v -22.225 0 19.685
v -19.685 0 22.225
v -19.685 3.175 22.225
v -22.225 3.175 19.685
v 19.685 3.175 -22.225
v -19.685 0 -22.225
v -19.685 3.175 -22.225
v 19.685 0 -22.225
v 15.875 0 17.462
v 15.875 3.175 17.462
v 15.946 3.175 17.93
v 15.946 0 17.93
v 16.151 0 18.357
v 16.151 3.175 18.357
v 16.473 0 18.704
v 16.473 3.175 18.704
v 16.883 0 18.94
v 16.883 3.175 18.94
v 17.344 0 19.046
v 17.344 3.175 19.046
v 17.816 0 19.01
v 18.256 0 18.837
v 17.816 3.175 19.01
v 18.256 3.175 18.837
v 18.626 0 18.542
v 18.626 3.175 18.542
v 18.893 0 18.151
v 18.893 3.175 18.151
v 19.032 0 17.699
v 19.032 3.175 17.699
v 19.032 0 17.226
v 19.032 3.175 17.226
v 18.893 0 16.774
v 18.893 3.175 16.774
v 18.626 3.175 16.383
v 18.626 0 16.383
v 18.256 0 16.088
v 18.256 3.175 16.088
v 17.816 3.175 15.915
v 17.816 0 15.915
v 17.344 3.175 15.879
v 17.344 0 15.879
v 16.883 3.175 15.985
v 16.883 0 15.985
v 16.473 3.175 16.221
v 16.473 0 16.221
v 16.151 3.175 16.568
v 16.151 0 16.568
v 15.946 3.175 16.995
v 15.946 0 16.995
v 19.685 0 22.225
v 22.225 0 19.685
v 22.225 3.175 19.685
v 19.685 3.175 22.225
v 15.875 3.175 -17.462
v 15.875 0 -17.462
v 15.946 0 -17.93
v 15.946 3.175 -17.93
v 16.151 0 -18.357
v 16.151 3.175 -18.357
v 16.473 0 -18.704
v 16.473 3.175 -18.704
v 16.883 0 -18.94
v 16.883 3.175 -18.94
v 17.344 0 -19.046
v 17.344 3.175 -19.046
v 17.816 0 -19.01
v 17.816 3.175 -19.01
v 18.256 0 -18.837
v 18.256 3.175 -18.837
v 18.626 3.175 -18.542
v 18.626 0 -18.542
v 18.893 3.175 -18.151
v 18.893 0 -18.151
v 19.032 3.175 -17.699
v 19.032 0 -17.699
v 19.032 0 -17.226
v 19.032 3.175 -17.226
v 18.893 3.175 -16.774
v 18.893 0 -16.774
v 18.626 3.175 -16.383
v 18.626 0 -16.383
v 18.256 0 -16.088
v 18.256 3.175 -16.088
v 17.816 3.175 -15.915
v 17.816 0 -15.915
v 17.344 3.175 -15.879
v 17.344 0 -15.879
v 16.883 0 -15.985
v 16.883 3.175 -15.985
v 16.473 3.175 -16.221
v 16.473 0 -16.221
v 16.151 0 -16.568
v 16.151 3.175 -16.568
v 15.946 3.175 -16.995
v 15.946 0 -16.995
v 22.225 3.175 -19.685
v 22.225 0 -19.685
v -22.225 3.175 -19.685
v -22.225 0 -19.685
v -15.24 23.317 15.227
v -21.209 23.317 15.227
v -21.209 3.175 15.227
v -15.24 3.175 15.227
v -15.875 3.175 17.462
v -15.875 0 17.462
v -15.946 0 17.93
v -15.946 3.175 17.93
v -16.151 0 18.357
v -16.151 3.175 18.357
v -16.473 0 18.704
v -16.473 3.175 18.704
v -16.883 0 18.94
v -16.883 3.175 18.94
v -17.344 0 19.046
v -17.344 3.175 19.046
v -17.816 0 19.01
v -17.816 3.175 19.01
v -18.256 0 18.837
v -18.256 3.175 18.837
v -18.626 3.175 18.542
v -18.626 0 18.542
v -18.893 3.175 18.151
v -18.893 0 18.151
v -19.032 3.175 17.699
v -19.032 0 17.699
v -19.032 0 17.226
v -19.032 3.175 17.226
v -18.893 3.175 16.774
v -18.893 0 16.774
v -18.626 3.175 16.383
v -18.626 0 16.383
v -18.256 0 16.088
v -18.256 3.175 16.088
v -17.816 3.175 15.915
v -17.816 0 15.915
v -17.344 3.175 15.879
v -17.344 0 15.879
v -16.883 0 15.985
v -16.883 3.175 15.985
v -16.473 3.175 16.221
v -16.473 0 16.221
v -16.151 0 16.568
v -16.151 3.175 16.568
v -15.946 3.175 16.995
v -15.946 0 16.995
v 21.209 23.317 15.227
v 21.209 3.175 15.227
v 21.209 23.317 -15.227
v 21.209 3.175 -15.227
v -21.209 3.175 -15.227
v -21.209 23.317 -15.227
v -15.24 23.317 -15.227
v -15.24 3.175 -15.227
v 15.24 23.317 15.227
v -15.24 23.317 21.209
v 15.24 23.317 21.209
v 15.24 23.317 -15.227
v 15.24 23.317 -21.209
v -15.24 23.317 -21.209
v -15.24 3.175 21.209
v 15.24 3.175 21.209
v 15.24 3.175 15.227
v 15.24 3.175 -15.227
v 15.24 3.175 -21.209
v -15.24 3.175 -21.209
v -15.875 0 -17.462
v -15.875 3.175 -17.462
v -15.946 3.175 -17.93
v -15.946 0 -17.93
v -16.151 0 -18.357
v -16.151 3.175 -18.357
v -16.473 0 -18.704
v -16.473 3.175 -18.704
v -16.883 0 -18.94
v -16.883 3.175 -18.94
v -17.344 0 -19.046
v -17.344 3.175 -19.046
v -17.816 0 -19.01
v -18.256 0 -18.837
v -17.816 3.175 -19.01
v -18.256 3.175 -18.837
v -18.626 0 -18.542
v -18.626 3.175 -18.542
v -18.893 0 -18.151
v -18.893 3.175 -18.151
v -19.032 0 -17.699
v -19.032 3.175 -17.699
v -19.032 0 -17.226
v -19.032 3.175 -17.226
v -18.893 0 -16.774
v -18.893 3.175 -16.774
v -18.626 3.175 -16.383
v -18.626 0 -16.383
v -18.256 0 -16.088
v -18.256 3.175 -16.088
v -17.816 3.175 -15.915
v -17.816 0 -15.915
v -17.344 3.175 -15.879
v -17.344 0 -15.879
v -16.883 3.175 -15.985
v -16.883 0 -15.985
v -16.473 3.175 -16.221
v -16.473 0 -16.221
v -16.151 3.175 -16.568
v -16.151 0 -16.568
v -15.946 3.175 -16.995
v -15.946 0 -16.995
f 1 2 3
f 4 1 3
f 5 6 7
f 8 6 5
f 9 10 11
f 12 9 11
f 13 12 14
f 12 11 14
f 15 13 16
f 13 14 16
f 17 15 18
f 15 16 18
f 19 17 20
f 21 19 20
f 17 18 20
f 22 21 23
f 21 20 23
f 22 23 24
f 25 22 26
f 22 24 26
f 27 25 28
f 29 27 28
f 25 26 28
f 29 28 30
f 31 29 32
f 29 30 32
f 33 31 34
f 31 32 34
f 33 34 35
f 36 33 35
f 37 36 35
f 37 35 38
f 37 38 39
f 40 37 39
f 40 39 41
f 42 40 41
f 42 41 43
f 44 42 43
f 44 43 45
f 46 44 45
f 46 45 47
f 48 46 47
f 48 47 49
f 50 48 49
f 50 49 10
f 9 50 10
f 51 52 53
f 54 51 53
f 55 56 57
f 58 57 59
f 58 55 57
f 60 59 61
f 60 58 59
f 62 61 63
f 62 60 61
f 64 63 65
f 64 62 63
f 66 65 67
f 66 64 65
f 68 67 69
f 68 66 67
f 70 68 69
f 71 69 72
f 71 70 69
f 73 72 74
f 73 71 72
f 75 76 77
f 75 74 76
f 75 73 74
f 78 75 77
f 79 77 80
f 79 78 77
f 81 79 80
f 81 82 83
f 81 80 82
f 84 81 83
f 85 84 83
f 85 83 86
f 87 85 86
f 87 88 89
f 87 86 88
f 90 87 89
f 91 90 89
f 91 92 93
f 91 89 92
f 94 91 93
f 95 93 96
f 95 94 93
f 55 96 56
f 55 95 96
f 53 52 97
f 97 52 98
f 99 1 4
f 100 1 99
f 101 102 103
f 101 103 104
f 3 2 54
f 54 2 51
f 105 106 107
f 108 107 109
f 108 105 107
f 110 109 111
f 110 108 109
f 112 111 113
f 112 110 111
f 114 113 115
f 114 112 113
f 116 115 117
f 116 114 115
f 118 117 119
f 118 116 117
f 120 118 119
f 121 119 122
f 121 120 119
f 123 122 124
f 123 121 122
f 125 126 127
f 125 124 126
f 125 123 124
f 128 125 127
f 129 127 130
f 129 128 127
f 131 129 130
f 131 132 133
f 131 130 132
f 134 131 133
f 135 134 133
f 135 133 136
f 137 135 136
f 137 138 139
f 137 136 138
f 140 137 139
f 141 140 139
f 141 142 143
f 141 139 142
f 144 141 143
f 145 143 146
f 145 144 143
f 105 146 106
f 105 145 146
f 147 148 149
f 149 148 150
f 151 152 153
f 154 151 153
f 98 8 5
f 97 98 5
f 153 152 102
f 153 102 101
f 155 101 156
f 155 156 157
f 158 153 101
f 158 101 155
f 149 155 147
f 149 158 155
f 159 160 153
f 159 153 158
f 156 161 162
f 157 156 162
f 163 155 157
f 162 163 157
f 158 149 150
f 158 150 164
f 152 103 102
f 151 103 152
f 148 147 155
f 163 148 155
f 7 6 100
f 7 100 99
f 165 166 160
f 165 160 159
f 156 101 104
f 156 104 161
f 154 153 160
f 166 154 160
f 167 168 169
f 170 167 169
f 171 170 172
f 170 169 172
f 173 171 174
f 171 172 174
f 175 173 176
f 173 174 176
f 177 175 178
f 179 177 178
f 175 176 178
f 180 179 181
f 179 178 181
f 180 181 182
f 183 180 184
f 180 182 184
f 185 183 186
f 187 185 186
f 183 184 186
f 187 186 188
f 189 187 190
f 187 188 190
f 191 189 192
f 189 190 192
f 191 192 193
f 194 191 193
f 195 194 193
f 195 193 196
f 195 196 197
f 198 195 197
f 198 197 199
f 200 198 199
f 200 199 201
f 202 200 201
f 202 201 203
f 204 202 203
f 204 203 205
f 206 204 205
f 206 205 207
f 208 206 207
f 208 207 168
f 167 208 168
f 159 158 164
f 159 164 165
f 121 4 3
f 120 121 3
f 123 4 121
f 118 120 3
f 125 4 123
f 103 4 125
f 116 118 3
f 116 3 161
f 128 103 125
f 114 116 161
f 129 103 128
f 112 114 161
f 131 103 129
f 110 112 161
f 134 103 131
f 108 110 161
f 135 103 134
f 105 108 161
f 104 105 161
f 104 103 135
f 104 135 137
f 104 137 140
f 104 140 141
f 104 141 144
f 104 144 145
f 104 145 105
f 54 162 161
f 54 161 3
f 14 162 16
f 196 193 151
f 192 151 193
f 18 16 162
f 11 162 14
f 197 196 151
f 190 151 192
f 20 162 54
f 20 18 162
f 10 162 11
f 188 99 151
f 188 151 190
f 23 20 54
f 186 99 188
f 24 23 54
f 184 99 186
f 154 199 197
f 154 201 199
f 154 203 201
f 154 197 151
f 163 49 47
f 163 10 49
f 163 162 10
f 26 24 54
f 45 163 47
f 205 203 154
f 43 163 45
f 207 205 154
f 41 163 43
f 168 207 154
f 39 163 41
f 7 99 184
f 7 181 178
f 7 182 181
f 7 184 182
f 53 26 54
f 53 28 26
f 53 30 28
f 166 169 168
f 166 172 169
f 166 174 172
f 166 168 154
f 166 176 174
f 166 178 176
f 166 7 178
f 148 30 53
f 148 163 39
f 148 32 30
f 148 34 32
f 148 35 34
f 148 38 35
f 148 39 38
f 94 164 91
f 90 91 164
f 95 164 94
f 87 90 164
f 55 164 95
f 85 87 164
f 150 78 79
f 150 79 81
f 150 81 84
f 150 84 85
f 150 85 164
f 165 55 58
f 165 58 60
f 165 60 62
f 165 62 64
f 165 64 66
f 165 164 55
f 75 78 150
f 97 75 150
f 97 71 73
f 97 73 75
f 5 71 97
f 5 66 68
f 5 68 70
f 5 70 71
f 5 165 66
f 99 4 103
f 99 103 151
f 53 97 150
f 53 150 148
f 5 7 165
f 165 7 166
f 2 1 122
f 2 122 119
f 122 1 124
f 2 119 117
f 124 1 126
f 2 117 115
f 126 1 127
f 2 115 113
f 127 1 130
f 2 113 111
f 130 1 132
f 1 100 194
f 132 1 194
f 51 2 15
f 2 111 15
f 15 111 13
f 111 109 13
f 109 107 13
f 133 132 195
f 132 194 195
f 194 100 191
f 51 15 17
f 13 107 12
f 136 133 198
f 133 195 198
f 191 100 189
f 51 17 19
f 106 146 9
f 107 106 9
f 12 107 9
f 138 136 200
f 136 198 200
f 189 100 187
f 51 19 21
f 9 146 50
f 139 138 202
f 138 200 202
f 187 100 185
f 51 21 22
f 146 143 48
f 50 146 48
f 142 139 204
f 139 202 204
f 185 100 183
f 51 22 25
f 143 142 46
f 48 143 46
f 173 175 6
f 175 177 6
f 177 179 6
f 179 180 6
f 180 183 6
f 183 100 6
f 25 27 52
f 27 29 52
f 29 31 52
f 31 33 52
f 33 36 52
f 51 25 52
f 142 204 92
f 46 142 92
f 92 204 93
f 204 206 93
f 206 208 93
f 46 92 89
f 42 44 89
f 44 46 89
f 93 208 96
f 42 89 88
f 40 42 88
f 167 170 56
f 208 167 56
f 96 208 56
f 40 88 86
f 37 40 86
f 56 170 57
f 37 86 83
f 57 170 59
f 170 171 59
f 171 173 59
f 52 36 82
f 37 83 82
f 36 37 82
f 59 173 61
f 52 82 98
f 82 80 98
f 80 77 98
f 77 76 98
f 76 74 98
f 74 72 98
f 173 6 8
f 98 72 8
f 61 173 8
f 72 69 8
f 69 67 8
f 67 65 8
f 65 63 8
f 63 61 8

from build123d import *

# Parameters (mm, degrees)
SKETCH2_W                                  = 44.45
SKETCH2_H                                  = 44.45
BOSS_EXTRUDE1_DEPTH                        = 3.175
CHAMFER1_SIZE                              = 2.54
SKETCH3_R                                  = 1.5875
CUT_EXTRUDE1_DEPTH                         = 4.175
MIRROR2_COPY_1_SKETCH_R                    = 1.5875
MIRROR2_COPY_1_DEPTH                       = 4.175
SKETCH4_W                                  = 42.418
SKETCH4_H                                  = 42.418
BOSS_EXTRUDE2_DEPTH                        = 20.1422
SKETCH5_W                                  = 5.969
SKETCH5_H                                  = 5.9817
CUT_EXTRUDE2_DEPTH                         = 20.1422
MIRROR3_AT_THE_SECOND_PLANE_COPY_1_SKETC_W = 5.969
MIRROR3_AT_THE_SECOND_PLANE_COPY_1_SKETC_H = 5.9817
MIRROR3_AT_THE_SECOND_PLANE_COPY_1_DEPTH   = 20.1422


with BuildPart() as part:
    # Sketch2 → Boss-Extrude1 (new body)
    with BuildSketch(Plane(origin=(0, 0, 0), x_dir=(1, 0, 0), z_dir=(0, 1, 0))):
        Rectangle(SKETCH2_W, SKETCH2_H)
    extrude(amount=BOSS_EXTRUDE1_DEPTH)

    # Chamfer1
    chamfer1_edges = [part.edges().sort_by_distance(p)[0] for p in [
        (22.225, 1.5875, 22.225),
        (-22.225, 1.5875, 22.225),
        (-22.225, 1.5875, -22.225),
        (22.225, 1.5875, -22.225),
    ]]
    chamfer(chamfer1_edges, length=CHAMFER1_SIZE)

    # Sketch3 → Cut-Extrude1 (cut, through all)
    with BuildSketch(Plane(origin=(0, 3.175, 0), x_dir=(1, 0, 0), z_dir=(0, 1, 0))):
        with Locations((-17.4625, 17.4625)):
            Circle(SKETCH3_R)
    cut_extrude1 = extrude(amount=-CUT_EXTRUDE1_DEPTH, mode=Mode.SUBTRACT)

    # Mirror1: Cut-Extrude1 across plane
    add(cut_extrude1.mirror(Plane(origin=(0, 0, 0), x_dir=(0, 0, 1), z_dir=(1, 0, 0))), mode=Mode.SUBTRACT)

    # Mirror2: Cut-Extrude1 across plane
    add(cut_extrude1.mirror(Plane.XY), mode=Mode.SUBTRACT)

    # Mirror2 copy 1 sketch → Mirror2 copy 1 (cut, through all)
    with BuildSketch(Plane(origin=(0, 3.175, 0), x_dir=(-1, 0, 0), z_dir=(0, 1, 0))):
        with Locations((-17.4625, 17.4625)):
            Circle(MIRROR2_COPY_1_SKETCH_R)
    extrude(amount=-MIRROR2_COPY_1_DEPTH, mode=Mode.SUBTRACT)

    # Sketch4 → Boss-Extrude2 (add)
    with BuildSketch(Plane(origin=(0, 3.175, 0), x_dir=(1, 0, 0), z_dir=(0, 1, 0))):
        Rectangle(SKETCH4_W, SKETCH4_H)
    extrude(amount=BOSS_EXTRUDE2_DEPTH)

    # Sketch5 → Cut-Extrude2 (cut)
    with BuildSketch(Plane(origin=(0, 23.3172, 0), x_dir=(1, 0, 0), z_dir=(0, 1, 0))):
        with Locations((-18.2245, 18.21815)):
            Rectangle(SKETCH5_W, SKETCH5_H)
    cut_extrude2 = extrude(amount=-CUT_EXTRUDE2_DEPTH, mode=Mode.SUBTRACT)

    # Mirror3: Cut-Extrude2 across plane
    add(cut_extrude2.mirror(Plane(origin=(0, 0, 0), x_dir=(0, 0, 1), z_dir=(1, 0, 0))), mode=Mode.SUBTRACT)

    # Mirror3 at the second plane: Cut-Extrude2 across plane
    add(cut_extrude2.mirror(Plane.XY), mode=Mode.SUBTRACT)

    # Mirror3 at the second plane copy 1 sketc → Mirror3 at the second plane copy 1 (cut)
    with BuildSketch(Plane(origin=(0, 23.3172, 0), x_dir=(-1, 0, 0), z_dir=(0, 1, 0))):
        with Locations((-18.2245, 18.21815)):
            Rectangle(MIRROR3_AT_THE_SECOND_PLANE_COPY_1_SKETC_W, MIRROR3_AT_THE_SECOND_PLANE_COPY_1_SKETC_H)
    extrude(amount=-MIRROR3_AT_THE_SECOND_PLANE_COPY_1_DEPTH, mode=Mode.SUBTRACT)


solid = part.part
